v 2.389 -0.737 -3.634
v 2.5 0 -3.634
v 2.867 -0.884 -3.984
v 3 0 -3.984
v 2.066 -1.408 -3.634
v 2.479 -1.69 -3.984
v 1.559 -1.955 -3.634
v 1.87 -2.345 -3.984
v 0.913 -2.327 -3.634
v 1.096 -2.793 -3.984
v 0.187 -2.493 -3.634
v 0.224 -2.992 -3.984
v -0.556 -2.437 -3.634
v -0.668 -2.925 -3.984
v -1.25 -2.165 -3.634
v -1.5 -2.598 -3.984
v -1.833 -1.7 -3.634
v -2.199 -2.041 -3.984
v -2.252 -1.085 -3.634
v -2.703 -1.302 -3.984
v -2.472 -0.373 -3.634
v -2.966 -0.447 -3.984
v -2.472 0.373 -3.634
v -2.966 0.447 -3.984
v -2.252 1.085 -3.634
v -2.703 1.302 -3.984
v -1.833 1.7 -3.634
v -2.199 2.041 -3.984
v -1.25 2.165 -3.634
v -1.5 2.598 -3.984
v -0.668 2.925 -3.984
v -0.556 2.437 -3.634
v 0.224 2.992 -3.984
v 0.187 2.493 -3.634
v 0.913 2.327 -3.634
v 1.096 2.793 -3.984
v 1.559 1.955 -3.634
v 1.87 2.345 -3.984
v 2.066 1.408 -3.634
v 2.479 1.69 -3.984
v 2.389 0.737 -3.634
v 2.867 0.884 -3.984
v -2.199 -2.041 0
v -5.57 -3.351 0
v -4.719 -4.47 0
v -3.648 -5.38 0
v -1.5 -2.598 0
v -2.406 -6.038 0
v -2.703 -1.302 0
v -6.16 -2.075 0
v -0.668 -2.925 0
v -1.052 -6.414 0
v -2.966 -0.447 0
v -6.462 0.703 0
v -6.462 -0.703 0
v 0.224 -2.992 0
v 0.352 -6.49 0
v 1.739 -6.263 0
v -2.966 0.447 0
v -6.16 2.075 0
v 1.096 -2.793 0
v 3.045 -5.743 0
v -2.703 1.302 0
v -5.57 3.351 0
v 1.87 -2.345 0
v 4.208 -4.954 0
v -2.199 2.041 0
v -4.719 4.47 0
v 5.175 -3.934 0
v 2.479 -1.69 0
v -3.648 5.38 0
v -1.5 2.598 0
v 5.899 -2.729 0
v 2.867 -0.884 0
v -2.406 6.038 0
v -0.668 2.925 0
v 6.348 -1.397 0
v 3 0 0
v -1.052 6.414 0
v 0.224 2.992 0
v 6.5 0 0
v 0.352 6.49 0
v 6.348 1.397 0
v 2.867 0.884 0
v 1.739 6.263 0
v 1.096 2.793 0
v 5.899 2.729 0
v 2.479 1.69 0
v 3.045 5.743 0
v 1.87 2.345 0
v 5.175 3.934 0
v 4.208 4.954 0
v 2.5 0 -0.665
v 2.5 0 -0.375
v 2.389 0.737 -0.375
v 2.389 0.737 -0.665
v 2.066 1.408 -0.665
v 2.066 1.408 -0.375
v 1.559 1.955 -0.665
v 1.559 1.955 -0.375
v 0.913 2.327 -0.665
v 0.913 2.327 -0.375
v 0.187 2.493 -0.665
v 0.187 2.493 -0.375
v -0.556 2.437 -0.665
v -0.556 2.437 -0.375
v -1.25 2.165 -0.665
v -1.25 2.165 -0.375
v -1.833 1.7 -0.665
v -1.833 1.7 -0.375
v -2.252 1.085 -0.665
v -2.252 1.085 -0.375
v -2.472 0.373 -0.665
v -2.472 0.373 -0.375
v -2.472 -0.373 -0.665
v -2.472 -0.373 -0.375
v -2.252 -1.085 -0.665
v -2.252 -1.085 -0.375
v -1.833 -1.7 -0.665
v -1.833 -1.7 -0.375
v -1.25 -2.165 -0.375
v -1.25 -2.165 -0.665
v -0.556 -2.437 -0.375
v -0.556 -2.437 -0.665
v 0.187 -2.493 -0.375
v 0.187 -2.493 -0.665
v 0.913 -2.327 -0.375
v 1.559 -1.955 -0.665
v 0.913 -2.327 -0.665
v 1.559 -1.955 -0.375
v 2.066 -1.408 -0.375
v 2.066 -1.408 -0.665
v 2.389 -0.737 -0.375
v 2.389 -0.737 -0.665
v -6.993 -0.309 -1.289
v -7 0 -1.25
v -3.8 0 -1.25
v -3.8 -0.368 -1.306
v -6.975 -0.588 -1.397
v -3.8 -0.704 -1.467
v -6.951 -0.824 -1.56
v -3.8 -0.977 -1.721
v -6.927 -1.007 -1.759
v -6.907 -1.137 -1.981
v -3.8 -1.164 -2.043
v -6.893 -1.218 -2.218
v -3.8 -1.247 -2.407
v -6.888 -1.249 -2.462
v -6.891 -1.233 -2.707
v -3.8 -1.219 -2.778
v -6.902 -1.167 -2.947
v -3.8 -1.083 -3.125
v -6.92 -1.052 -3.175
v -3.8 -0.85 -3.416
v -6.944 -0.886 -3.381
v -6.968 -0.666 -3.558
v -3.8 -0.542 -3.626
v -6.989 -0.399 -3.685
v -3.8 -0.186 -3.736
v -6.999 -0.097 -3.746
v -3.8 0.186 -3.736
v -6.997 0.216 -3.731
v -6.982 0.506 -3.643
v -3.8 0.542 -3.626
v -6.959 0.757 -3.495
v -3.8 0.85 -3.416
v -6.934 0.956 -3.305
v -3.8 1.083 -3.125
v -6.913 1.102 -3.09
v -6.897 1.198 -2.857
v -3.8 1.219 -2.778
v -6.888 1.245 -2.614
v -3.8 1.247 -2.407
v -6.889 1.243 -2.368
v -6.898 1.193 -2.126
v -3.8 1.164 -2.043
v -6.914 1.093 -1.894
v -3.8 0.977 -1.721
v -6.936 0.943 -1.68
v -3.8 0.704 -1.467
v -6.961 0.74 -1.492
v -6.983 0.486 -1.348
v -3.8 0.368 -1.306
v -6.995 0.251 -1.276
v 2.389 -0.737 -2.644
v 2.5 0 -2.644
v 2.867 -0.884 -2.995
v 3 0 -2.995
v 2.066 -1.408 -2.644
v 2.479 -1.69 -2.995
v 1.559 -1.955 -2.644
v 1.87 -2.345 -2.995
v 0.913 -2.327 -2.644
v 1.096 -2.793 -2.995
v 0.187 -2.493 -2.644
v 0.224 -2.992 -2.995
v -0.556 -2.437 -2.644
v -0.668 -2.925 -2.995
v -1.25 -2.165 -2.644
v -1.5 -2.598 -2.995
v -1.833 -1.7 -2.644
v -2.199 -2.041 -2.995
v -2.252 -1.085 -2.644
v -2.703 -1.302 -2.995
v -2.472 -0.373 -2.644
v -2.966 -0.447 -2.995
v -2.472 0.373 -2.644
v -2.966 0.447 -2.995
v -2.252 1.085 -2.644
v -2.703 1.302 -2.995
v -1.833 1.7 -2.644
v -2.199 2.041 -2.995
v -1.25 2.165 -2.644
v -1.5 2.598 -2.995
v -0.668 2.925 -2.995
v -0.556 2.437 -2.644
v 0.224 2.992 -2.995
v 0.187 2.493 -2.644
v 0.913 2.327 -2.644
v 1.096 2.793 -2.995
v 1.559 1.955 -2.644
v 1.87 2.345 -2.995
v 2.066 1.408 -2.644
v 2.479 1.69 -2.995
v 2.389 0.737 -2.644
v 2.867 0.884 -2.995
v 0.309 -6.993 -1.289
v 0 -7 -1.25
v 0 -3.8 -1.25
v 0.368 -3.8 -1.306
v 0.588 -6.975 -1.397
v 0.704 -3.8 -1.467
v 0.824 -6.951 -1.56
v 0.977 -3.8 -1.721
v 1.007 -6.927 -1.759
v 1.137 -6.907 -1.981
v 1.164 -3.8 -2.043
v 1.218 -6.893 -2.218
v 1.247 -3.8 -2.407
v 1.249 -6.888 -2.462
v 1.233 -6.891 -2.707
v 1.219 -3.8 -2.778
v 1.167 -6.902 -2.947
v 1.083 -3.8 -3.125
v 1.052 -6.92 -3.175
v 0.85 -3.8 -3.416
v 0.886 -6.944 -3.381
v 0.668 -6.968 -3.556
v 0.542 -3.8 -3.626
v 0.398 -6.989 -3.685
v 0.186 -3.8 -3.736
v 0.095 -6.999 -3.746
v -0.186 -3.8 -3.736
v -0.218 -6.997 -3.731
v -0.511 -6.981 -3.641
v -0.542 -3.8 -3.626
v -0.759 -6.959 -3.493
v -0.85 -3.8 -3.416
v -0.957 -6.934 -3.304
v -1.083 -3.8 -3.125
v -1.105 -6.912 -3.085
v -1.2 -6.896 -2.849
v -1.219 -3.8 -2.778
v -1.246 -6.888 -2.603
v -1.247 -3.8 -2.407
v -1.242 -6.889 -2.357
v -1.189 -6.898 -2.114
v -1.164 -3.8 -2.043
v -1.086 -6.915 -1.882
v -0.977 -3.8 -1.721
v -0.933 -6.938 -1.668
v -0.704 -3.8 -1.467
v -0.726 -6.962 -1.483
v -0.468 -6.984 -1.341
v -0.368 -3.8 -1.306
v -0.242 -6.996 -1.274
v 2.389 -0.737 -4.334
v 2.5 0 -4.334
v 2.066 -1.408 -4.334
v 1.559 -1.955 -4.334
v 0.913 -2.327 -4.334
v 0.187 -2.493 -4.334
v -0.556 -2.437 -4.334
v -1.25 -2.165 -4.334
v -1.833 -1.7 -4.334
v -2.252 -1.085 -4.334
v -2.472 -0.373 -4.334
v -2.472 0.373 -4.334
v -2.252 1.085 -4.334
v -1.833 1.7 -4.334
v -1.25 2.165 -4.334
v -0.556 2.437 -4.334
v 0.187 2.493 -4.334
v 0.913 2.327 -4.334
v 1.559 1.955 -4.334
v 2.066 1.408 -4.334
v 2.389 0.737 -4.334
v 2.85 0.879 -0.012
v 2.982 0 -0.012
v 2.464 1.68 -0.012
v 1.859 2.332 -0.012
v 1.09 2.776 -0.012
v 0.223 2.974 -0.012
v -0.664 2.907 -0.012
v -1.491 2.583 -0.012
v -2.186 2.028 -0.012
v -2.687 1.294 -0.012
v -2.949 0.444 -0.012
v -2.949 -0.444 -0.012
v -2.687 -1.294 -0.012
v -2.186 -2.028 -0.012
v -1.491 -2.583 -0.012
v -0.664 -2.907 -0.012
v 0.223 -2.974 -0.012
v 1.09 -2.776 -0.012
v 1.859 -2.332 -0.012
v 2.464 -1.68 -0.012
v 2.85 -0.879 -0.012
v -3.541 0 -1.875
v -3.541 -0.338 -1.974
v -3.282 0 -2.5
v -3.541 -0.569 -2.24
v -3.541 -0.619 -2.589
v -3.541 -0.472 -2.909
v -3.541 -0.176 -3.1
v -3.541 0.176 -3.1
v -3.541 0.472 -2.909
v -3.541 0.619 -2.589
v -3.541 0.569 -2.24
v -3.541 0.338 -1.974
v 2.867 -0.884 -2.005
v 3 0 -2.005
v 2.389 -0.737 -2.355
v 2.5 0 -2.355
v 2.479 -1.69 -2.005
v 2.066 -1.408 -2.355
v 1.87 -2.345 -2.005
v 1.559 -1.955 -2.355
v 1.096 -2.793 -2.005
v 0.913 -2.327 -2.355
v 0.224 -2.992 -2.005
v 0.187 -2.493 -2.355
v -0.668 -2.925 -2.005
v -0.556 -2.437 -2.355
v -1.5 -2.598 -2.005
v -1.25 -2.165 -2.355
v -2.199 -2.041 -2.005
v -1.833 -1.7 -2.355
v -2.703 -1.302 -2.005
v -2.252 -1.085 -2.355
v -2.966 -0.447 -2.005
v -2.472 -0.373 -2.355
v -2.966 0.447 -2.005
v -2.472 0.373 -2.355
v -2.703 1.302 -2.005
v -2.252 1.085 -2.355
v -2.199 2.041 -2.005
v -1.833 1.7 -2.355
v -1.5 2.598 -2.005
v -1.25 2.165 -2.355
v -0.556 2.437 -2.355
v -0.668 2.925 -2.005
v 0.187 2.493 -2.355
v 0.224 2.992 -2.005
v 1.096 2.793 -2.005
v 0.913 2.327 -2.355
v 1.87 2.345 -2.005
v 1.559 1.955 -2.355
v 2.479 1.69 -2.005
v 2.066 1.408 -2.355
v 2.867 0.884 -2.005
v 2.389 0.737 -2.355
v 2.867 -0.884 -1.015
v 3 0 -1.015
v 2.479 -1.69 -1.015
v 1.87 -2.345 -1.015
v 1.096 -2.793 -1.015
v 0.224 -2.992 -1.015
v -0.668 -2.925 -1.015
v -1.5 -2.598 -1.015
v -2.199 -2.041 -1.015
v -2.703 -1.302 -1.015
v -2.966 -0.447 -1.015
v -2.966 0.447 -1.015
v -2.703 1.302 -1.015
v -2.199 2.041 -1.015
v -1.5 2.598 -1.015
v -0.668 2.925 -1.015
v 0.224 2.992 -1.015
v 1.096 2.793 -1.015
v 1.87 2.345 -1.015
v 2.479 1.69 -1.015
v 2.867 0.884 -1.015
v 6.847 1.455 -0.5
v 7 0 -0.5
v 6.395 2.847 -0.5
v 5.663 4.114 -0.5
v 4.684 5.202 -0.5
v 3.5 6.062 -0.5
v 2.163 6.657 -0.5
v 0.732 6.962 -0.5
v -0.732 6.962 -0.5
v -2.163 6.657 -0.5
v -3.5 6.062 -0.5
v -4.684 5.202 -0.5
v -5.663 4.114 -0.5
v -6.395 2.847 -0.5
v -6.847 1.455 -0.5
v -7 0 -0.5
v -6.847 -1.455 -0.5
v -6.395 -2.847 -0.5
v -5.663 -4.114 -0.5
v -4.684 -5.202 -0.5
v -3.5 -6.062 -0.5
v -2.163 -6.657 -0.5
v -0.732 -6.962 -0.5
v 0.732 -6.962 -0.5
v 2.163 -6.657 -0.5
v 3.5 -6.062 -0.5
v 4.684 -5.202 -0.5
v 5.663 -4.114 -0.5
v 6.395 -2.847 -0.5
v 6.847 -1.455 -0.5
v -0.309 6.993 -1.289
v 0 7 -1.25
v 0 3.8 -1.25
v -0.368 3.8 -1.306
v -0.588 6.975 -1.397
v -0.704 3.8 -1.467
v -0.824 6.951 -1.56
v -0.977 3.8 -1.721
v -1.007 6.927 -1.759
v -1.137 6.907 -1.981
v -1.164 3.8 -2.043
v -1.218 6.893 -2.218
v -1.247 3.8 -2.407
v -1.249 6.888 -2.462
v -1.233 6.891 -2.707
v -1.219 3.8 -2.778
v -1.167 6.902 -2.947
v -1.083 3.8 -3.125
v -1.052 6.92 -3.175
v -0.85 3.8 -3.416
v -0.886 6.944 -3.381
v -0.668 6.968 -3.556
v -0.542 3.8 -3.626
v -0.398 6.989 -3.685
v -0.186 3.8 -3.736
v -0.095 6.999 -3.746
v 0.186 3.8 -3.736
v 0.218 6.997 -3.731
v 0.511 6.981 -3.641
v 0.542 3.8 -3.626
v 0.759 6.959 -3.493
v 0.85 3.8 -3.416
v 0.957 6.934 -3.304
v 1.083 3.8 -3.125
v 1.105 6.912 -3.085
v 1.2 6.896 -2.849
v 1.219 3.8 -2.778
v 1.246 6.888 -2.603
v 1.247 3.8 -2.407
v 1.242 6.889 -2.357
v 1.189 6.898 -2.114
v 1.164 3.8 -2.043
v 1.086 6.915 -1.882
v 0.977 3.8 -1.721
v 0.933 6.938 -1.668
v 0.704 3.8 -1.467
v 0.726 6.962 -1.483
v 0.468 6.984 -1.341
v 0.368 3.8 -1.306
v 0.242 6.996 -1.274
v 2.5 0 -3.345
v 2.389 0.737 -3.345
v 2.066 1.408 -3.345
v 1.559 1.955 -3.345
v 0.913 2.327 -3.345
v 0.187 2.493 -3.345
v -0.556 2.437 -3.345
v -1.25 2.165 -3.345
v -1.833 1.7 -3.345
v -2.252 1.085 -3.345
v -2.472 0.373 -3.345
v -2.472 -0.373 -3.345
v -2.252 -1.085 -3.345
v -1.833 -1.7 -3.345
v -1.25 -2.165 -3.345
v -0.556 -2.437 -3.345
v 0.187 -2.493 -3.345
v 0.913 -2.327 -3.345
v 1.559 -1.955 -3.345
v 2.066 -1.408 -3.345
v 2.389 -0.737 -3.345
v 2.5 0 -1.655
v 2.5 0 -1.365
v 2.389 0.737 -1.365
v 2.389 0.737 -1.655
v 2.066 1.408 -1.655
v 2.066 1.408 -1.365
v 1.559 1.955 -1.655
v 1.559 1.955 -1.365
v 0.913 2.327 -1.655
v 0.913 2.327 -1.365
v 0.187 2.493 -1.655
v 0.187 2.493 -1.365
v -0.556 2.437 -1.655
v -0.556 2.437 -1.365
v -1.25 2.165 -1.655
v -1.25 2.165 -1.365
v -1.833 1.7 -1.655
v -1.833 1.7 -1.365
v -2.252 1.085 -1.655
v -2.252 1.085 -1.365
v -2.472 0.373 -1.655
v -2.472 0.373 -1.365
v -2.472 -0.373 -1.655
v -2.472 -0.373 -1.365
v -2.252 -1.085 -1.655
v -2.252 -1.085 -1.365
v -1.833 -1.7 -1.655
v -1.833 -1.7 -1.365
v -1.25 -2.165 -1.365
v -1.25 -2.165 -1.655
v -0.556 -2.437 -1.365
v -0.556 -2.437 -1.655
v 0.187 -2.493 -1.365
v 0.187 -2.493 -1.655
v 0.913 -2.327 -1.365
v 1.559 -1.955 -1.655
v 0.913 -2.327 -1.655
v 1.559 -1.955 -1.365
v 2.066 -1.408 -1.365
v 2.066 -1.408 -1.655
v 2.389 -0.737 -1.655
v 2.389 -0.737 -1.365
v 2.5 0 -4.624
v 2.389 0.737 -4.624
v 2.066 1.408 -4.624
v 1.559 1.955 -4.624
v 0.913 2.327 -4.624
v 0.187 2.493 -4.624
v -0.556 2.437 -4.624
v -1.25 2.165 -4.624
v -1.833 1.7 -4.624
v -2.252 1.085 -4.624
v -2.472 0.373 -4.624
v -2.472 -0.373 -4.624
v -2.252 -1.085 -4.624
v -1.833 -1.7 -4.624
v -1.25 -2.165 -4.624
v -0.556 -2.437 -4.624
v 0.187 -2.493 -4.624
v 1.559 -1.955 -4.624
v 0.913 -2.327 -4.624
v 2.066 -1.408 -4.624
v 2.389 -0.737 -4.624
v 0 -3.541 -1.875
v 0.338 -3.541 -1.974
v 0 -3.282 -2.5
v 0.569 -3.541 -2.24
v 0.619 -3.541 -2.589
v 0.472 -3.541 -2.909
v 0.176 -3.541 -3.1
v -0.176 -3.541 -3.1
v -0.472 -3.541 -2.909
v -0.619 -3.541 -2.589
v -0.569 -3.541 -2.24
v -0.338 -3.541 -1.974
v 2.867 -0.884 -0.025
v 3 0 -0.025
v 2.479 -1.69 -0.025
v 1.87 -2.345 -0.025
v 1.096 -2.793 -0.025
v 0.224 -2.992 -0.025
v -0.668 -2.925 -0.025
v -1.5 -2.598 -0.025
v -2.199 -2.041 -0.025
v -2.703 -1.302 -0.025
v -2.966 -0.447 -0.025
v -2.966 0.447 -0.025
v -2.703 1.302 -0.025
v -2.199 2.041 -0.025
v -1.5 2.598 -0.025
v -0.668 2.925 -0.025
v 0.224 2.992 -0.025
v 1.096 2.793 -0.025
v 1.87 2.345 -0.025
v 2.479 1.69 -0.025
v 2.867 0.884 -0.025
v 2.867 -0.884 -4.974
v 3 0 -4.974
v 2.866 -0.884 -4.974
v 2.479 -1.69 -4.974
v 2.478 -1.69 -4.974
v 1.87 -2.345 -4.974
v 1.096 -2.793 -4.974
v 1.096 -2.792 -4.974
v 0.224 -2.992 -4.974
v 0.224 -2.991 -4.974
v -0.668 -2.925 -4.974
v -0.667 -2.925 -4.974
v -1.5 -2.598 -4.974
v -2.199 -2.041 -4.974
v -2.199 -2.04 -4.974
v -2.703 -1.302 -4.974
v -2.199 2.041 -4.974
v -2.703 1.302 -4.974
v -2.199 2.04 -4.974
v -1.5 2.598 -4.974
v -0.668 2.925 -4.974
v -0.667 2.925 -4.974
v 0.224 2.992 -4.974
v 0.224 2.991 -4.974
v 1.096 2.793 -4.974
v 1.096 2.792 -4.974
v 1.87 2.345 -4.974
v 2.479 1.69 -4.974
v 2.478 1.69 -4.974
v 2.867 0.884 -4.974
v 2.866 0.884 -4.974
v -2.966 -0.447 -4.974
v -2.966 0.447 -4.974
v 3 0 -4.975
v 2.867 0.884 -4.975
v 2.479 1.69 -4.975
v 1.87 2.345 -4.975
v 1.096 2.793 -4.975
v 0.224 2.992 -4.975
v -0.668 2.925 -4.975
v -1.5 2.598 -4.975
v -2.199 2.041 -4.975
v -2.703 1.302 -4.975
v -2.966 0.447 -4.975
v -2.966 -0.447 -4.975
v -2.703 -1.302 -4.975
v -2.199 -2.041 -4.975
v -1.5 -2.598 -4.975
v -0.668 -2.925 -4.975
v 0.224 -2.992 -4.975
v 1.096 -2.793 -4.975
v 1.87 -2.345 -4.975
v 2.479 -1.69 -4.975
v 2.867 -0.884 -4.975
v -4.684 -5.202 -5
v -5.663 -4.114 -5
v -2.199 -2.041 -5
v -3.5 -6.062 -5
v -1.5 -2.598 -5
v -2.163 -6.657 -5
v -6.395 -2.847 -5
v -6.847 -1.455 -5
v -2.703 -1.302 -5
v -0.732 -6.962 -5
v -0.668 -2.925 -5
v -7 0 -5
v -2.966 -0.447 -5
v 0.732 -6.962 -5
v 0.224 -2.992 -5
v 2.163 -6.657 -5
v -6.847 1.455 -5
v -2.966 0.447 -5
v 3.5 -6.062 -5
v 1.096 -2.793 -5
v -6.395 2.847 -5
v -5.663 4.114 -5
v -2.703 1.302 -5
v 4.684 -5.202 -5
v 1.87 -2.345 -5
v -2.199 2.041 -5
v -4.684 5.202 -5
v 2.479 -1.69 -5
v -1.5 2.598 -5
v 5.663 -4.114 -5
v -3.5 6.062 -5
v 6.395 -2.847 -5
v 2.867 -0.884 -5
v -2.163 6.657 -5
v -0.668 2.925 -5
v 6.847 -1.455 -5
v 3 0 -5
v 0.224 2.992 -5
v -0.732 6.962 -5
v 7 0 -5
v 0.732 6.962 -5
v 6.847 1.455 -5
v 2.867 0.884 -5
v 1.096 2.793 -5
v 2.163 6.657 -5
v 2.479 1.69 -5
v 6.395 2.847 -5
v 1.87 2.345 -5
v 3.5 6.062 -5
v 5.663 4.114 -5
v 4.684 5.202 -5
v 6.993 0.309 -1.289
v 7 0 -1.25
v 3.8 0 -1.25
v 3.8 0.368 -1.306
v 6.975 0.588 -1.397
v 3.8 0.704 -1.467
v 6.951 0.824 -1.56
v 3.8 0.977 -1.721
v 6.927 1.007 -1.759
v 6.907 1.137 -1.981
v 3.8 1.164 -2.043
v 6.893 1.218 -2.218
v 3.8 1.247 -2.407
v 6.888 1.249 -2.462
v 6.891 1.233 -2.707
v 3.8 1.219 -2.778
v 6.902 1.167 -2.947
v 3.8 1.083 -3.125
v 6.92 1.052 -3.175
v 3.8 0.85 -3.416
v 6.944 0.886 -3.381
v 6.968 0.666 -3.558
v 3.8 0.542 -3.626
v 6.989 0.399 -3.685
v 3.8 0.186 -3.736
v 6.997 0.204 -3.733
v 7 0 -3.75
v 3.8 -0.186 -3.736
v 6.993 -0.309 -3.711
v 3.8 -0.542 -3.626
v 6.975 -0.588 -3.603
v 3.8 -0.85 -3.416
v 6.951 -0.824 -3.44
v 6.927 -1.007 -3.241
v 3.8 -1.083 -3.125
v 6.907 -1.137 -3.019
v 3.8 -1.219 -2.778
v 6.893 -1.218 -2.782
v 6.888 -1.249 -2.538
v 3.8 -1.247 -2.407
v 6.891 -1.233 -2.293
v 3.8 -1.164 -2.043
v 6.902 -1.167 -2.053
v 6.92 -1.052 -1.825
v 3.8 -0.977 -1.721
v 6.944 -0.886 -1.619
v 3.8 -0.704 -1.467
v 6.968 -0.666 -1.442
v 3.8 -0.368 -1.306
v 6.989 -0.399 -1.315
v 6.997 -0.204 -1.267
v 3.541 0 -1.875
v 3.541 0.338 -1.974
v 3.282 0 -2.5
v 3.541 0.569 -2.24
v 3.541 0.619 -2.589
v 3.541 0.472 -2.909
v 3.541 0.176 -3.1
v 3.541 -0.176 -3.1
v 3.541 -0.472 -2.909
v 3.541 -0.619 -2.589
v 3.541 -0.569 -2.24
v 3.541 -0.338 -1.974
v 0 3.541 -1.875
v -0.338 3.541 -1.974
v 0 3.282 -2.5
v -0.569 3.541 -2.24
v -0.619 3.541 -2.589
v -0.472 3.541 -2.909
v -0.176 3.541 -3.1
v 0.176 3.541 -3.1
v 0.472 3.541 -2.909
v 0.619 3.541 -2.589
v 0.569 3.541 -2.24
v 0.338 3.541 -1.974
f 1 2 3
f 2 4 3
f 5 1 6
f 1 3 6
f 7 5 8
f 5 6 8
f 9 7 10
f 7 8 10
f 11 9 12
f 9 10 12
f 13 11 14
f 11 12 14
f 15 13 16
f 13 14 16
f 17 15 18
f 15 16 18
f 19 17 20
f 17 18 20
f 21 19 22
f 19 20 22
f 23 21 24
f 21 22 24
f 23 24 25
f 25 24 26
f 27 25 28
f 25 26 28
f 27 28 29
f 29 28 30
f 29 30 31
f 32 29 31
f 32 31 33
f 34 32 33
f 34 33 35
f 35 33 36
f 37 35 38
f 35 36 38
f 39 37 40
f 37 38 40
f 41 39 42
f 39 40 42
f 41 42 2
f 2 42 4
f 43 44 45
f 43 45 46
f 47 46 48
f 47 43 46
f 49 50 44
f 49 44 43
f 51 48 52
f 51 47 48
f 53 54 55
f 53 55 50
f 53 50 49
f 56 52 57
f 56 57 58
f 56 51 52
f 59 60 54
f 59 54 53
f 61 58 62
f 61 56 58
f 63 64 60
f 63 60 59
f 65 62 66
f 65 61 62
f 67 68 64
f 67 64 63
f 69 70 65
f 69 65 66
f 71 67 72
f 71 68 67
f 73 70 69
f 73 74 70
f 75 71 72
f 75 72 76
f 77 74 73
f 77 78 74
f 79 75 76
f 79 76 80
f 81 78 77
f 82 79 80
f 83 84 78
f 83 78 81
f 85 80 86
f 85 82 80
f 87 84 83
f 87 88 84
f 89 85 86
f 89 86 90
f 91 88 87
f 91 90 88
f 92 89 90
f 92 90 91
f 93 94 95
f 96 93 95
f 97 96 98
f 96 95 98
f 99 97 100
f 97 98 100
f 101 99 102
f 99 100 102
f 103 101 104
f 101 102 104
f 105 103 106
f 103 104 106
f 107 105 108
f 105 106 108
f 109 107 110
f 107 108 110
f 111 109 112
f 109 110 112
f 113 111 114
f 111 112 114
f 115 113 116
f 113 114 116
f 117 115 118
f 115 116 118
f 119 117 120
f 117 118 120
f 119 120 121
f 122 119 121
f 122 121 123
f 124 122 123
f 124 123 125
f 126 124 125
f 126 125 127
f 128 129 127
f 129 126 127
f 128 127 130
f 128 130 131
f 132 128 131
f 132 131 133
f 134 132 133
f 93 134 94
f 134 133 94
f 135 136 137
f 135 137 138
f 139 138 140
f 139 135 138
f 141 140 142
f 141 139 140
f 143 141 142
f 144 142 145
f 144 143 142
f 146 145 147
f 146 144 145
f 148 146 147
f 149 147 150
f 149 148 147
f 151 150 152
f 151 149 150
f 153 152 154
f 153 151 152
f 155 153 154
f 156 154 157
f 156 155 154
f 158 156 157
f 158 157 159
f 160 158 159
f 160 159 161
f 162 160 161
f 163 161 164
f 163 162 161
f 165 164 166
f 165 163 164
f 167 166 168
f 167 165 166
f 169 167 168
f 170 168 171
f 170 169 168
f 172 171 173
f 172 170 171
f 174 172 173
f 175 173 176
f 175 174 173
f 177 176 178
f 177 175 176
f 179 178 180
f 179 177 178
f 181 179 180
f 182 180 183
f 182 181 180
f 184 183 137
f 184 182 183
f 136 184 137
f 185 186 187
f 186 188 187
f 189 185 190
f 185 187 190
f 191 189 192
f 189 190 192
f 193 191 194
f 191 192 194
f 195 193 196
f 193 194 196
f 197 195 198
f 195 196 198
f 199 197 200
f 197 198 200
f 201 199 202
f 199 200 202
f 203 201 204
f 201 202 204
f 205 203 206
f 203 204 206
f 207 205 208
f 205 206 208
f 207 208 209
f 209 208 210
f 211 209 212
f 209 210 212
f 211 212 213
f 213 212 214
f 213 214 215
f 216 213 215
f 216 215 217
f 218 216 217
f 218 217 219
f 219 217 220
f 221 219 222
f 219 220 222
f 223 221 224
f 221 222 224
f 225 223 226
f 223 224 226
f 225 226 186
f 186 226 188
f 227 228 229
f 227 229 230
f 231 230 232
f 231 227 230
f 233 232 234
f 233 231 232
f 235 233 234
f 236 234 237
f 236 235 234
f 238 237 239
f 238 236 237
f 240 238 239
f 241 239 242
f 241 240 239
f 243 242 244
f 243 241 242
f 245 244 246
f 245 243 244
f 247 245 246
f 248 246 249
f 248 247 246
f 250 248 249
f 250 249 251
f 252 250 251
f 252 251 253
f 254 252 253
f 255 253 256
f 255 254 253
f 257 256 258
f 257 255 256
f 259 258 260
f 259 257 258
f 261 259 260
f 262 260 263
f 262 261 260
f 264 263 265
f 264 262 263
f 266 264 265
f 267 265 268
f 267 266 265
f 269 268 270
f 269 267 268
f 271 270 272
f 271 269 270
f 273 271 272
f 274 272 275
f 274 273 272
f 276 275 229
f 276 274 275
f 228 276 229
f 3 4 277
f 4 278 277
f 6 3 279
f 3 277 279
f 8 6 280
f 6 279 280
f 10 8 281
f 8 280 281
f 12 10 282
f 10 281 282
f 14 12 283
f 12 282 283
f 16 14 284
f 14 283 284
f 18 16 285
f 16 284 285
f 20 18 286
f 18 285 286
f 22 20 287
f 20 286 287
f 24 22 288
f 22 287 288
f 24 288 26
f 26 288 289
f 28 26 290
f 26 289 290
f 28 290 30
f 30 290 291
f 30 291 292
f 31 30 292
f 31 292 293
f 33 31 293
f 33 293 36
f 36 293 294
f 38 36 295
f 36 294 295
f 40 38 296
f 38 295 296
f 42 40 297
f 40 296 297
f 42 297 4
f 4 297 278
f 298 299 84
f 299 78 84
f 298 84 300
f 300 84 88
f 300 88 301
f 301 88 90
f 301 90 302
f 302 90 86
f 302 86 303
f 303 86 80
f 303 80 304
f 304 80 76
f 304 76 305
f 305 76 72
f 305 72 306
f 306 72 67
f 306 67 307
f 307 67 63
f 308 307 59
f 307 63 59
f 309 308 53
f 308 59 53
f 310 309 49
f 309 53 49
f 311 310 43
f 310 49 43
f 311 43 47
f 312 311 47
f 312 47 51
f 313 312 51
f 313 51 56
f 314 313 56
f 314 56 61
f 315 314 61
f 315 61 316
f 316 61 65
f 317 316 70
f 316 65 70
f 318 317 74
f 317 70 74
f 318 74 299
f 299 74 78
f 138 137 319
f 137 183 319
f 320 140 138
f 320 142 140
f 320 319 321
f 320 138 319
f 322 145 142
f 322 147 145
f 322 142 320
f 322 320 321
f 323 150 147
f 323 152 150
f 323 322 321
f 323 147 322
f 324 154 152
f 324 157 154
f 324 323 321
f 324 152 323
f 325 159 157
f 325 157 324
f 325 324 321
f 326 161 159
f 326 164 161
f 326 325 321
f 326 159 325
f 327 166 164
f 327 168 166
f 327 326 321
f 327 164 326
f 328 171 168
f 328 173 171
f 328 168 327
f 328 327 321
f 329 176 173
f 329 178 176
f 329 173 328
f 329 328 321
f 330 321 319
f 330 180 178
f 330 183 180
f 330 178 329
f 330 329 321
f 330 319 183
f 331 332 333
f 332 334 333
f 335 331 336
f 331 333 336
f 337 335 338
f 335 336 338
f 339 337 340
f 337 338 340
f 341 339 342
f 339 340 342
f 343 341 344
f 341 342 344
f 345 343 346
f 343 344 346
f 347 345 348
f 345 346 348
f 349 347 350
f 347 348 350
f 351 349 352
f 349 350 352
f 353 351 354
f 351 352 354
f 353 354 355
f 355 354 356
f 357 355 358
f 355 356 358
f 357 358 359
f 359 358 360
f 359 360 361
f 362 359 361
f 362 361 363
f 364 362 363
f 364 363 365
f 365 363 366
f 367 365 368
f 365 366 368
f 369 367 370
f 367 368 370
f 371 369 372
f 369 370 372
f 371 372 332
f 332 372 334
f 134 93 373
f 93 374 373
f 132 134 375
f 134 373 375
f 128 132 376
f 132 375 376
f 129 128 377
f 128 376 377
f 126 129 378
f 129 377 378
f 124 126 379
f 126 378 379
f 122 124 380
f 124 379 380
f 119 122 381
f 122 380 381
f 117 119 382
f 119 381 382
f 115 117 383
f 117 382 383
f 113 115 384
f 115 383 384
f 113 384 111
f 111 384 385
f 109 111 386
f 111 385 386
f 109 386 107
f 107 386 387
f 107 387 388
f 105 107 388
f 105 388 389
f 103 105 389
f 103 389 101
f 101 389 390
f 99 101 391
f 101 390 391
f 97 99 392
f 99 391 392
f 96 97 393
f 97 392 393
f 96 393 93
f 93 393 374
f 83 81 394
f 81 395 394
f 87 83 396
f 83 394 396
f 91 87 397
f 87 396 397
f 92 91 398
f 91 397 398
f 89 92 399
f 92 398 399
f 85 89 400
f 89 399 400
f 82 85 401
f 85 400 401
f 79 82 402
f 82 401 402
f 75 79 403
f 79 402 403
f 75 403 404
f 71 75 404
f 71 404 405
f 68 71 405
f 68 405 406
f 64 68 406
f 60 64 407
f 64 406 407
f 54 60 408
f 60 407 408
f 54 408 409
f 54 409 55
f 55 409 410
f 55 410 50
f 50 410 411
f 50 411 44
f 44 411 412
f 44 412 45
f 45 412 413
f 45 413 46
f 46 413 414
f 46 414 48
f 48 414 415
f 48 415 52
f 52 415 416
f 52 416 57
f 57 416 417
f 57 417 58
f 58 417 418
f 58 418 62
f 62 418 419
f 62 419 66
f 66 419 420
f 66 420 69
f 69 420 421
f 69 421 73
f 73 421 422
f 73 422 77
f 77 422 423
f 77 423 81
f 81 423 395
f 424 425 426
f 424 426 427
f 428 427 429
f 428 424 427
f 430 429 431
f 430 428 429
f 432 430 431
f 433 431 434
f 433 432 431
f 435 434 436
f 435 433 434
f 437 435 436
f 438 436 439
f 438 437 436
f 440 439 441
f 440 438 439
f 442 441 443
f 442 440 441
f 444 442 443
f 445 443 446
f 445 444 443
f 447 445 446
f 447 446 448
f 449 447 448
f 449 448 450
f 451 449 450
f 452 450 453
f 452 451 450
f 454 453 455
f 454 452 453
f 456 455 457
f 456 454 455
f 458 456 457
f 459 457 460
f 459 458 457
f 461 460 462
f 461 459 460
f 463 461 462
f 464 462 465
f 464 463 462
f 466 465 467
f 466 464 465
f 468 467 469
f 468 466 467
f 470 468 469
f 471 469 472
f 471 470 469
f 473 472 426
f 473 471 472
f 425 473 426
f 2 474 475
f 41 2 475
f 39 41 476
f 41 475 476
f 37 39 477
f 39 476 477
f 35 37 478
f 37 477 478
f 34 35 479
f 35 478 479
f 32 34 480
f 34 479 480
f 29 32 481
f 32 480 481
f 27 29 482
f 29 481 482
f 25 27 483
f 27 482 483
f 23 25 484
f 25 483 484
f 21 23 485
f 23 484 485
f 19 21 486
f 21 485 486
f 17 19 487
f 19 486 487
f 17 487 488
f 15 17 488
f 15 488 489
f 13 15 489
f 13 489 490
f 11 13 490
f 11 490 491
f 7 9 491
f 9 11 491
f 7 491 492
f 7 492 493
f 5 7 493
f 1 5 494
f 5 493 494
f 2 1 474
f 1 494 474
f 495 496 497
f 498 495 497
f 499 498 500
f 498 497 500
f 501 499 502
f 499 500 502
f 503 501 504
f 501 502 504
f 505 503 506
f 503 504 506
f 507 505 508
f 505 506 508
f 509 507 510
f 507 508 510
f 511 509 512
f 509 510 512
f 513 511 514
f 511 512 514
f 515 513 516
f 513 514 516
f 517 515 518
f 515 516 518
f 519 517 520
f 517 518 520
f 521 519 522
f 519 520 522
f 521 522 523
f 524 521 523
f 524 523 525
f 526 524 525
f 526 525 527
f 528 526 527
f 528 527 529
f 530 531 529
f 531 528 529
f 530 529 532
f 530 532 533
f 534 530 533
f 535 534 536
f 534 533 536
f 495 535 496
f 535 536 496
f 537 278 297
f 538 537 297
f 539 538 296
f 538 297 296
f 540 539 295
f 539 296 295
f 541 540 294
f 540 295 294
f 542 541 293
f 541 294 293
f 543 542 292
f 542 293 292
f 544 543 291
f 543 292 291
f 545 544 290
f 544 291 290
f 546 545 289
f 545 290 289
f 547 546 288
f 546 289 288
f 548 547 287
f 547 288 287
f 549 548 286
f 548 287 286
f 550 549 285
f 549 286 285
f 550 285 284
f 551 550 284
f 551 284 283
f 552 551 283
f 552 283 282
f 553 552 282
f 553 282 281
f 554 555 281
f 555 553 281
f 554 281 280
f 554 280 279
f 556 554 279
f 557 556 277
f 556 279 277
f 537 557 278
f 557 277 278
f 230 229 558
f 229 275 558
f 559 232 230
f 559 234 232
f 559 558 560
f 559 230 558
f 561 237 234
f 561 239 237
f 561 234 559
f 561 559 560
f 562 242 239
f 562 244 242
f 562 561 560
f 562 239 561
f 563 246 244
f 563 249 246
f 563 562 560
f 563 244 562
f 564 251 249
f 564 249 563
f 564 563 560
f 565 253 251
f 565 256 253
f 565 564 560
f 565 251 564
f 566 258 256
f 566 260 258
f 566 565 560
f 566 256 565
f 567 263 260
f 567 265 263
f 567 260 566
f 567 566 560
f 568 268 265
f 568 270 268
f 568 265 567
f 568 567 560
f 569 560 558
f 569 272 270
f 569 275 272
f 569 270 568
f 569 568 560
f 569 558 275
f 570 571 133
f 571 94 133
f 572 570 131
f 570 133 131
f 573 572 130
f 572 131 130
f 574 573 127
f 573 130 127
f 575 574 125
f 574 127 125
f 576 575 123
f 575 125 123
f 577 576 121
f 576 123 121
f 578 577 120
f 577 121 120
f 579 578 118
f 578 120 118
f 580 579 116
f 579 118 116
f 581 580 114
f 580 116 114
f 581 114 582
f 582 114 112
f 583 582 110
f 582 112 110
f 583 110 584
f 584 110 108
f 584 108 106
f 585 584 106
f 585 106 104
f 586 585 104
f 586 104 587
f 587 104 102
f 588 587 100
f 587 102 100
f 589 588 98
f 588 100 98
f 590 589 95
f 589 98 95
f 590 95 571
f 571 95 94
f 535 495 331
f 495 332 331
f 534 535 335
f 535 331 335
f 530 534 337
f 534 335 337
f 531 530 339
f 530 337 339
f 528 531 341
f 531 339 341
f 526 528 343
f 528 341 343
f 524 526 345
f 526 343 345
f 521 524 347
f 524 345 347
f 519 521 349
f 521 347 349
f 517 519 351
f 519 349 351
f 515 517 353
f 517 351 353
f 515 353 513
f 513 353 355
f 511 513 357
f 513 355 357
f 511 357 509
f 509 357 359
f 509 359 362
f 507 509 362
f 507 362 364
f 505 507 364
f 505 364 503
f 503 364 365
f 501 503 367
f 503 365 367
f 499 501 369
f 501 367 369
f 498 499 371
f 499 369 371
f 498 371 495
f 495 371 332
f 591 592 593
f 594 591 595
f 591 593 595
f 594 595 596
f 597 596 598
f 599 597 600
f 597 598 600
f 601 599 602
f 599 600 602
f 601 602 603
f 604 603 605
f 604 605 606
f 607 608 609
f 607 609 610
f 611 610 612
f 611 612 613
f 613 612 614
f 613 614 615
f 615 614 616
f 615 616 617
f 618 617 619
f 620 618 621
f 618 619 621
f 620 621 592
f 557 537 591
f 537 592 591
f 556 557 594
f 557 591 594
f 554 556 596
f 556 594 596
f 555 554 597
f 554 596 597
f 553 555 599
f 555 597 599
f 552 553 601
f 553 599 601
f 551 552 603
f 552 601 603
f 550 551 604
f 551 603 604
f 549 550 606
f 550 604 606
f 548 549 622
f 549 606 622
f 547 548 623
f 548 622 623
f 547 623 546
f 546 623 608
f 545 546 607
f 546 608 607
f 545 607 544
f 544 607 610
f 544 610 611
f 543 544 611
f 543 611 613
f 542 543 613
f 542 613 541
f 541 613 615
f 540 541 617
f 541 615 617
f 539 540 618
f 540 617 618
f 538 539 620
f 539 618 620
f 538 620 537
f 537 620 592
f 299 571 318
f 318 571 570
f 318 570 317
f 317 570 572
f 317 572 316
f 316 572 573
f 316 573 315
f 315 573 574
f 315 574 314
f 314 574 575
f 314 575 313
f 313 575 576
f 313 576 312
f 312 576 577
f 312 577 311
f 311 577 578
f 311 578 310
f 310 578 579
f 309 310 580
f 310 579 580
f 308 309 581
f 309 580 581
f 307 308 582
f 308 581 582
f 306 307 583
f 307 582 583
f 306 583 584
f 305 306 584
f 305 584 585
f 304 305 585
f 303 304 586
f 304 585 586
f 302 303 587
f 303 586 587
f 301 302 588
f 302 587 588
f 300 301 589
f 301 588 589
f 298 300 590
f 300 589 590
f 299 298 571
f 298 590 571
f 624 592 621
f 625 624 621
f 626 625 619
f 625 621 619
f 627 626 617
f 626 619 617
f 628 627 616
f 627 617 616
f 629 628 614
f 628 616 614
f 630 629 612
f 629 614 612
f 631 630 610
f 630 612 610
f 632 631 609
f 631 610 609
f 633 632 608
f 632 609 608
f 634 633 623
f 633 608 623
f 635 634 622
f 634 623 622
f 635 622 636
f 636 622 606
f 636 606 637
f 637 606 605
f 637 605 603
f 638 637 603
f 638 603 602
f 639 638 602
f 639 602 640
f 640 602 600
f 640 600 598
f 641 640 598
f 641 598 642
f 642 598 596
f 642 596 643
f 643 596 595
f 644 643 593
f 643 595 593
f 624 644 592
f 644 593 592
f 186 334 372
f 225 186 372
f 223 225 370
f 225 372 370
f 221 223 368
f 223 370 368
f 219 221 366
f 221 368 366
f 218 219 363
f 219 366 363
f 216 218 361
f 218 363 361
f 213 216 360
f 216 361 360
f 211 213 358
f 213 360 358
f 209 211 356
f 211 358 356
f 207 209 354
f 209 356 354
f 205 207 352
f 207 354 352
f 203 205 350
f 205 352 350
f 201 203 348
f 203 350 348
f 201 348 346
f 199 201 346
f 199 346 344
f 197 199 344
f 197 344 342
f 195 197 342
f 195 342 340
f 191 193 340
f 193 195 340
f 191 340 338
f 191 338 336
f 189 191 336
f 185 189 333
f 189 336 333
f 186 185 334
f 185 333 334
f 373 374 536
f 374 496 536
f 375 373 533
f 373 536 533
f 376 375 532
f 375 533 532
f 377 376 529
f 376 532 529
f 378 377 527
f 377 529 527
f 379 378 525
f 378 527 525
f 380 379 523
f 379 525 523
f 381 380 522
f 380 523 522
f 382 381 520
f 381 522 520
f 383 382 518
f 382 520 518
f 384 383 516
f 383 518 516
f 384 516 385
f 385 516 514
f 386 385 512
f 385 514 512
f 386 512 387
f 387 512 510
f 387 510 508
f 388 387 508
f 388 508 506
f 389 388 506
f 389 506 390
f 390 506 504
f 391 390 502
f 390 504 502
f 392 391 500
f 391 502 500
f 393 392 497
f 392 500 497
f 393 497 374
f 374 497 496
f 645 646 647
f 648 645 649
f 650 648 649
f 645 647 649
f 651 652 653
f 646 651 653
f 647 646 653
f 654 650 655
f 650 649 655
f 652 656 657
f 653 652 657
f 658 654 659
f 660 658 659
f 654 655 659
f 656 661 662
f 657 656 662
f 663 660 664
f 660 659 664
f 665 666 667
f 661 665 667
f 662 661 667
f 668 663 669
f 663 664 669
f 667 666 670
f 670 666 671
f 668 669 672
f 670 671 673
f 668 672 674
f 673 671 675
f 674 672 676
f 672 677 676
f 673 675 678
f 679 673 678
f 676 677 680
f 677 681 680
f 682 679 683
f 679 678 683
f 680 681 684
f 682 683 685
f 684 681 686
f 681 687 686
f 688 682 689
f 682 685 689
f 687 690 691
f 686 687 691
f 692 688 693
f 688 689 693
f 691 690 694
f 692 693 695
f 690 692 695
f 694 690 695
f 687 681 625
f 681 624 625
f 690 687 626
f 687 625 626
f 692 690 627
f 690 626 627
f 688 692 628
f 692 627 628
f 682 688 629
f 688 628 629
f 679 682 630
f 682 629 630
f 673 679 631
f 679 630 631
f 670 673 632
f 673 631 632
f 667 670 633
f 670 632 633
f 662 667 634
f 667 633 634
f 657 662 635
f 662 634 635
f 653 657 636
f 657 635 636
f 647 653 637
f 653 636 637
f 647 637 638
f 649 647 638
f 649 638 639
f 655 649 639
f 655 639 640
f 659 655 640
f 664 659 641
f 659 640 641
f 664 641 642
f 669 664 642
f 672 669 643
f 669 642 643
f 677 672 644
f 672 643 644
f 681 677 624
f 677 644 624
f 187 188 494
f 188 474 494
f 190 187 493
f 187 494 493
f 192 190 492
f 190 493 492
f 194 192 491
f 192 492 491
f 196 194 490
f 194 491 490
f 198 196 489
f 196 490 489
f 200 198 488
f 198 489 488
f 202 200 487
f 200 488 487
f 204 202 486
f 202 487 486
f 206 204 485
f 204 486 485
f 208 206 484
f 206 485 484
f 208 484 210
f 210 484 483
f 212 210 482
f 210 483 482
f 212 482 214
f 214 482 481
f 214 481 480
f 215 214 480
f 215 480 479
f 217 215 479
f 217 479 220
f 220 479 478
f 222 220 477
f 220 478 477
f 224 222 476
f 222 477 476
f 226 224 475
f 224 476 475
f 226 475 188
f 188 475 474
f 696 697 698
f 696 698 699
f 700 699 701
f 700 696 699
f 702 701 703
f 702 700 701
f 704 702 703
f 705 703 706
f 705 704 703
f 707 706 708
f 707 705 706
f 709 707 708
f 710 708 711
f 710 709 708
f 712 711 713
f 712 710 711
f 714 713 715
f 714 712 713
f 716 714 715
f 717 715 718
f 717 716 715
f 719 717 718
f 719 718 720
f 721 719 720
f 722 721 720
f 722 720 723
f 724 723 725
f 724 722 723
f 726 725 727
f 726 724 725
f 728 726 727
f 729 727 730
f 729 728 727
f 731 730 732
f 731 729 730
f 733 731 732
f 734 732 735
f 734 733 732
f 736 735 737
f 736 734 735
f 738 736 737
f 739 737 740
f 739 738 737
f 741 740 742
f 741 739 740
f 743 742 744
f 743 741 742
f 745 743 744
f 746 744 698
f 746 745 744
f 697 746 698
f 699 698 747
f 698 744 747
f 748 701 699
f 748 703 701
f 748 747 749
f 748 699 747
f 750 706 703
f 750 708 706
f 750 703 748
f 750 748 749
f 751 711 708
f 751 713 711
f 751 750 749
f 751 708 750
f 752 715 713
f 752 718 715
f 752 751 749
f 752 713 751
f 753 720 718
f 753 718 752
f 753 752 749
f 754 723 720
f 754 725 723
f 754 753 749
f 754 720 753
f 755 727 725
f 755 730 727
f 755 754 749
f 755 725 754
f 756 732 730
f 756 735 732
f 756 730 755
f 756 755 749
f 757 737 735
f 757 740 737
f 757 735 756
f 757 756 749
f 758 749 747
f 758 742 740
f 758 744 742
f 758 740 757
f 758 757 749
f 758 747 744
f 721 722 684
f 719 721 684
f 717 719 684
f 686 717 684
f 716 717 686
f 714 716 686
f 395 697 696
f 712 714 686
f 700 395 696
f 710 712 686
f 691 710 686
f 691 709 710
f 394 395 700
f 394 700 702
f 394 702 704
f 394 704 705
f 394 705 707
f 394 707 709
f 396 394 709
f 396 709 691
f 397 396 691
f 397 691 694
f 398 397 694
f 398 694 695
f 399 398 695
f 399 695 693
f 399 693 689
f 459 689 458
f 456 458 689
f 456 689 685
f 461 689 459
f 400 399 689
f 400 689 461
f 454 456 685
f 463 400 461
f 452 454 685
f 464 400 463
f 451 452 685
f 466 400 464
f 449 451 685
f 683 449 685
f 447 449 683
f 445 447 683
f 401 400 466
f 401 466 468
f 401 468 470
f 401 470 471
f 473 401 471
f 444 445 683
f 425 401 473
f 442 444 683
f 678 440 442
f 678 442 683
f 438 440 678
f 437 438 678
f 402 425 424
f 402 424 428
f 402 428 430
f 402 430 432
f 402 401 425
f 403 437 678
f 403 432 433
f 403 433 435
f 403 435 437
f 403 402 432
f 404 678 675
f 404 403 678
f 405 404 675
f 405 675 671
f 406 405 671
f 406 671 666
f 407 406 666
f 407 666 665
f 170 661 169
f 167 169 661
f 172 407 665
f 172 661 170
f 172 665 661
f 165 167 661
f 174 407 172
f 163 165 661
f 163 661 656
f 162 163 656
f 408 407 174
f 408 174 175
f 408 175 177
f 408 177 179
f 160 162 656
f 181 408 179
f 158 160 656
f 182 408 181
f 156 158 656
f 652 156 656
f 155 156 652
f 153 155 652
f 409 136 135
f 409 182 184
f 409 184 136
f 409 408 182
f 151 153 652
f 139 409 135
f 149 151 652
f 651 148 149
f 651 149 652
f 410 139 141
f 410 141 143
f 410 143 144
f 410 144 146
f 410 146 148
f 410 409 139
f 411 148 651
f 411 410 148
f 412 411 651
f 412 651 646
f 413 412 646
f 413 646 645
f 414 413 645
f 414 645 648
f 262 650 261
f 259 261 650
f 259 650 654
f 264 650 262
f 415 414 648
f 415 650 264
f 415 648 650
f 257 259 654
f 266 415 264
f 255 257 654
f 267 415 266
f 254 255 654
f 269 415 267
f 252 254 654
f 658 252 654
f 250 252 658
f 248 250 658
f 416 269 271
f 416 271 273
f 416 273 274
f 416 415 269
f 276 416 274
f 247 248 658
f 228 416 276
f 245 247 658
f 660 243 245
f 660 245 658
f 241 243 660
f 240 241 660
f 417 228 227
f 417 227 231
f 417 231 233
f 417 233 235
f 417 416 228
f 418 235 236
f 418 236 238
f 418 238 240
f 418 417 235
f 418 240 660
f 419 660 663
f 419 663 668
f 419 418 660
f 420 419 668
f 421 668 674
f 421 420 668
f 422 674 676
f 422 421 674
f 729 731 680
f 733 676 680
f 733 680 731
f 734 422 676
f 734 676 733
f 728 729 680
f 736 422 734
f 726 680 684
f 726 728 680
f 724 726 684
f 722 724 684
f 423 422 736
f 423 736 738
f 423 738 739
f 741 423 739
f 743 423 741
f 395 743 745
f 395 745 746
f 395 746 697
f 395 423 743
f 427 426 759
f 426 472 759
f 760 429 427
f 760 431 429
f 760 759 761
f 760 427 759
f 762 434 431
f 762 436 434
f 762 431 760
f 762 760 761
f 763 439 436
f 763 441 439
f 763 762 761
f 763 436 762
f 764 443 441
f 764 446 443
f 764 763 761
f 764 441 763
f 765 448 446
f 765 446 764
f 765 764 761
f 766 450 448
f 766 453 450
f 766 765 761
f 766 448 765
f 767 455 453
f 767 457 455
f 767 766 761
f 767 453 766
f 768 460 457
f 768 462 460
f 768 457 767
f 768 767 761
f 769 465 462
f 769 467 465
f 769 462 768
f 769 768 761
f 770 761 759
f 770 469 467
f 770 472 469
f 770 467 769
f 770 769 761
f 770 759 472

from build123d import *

# Parameters (mm, degrees)
BASENUTSKE_R    = 7
BASENUTSKE_R_2  = 2.5
BASENUT_DEPTH   = 5
HOLES_COUNT     = 4
THDSCHPAT_COUNT = 6
THDSCHPAT_PITCH = 0.98984


with BuildPart() as part:
    # BaseNutSke → BaseNut (new body)
    with BuildSketch(Plane.XY):
        Circle(BASENUTSKE_R)
        Circle(BASENUTSKE_R_2, mode=Mode.SUBTRACT)
    extrude(amount=-BASENUT_DEPTH)

    # Chamfer1: read off the stored shape, not the designer's step
    # Chamfer1 outline → Chamfer1 (revolve, cut)
    with BuildSketch(Plane.XZ):
        Polygon((2.5, 0), (2.5, -0.350103769), (3, 0), align=None)
        Polygon((7, 0), (6.5, 0), (7, -0.5), align=None)
        Polygon((3, -4.9746), (2.5, -4.624496231), (2.5, -5), (3, -5), align=None)
    revolve(axis=Axis((0, 0, 0), (0, 0, 1)), mode=Mode.SUBTRACT)

    # HoleSke → Hole (revolve, cut)
    with BuildSketch(Plane(origin=(0, 0, 0), x_dir=(0, 0, -1), z_dir=(1, 0, 0)), mode=Mode.PRIVATE) as hole_sk:
        Polygon((2.5, 7), (2.5, 3.282233047), (3.75, 3.8), (3.75, 7), align=None)
    hole = revolve(hole_sk.sketch.rotate(Axis((0, 4.7625, -2.5), (0, -1, 0)), 180), axis=Axis((0, 4.7625, -2.5), (0, -1, 0)), mode=Mode.SUBTRACT)

    # Holes: Hole ×4 about axis
    holes_axis = Axis((0, 0, 0), (0, 0, 1))
    for i in range(1, HOLES_COUNT):
        add(hole.rotate(holes_axis, i * 360 / HOLES_COUNT), mode=Mode.SUBTRACT)

    # ThdSchSke → ThreadSchematic (revolve, cut)
    with BuildSketch(Plane(origin=(0, 0, 0), x_dir=(1, 0, 0), z_dir=(0, 1, 0)), mode=Mode.PRIVATE) as threadschematic_sk:
        Polygon((-3, 0.025), (-2.5, 0.375103769), (-1.25, 0.375103769), (-1.25, -0.325103769), (-2.5, -0.325103769), align=None)
    threadschematic = revolve(threadschematic_sk.sketch.rotate(Axis((0, 0, -0.525), (0, 0, -1)), 180), axis=Axis((0, 0, -0.525), (0, 0, -1)), mode=Mode.SUBTRACT)

    # ThdSchPat: ThreadSchematic ×6
    with Locations(*[(0, 0, -i * THDSCHPAT_PITCH) for i in range(1, THDSCHPAT_COUNT)]):
        add(threadschematic, mode=Mode.SUBTRACT)


solid = part.part
